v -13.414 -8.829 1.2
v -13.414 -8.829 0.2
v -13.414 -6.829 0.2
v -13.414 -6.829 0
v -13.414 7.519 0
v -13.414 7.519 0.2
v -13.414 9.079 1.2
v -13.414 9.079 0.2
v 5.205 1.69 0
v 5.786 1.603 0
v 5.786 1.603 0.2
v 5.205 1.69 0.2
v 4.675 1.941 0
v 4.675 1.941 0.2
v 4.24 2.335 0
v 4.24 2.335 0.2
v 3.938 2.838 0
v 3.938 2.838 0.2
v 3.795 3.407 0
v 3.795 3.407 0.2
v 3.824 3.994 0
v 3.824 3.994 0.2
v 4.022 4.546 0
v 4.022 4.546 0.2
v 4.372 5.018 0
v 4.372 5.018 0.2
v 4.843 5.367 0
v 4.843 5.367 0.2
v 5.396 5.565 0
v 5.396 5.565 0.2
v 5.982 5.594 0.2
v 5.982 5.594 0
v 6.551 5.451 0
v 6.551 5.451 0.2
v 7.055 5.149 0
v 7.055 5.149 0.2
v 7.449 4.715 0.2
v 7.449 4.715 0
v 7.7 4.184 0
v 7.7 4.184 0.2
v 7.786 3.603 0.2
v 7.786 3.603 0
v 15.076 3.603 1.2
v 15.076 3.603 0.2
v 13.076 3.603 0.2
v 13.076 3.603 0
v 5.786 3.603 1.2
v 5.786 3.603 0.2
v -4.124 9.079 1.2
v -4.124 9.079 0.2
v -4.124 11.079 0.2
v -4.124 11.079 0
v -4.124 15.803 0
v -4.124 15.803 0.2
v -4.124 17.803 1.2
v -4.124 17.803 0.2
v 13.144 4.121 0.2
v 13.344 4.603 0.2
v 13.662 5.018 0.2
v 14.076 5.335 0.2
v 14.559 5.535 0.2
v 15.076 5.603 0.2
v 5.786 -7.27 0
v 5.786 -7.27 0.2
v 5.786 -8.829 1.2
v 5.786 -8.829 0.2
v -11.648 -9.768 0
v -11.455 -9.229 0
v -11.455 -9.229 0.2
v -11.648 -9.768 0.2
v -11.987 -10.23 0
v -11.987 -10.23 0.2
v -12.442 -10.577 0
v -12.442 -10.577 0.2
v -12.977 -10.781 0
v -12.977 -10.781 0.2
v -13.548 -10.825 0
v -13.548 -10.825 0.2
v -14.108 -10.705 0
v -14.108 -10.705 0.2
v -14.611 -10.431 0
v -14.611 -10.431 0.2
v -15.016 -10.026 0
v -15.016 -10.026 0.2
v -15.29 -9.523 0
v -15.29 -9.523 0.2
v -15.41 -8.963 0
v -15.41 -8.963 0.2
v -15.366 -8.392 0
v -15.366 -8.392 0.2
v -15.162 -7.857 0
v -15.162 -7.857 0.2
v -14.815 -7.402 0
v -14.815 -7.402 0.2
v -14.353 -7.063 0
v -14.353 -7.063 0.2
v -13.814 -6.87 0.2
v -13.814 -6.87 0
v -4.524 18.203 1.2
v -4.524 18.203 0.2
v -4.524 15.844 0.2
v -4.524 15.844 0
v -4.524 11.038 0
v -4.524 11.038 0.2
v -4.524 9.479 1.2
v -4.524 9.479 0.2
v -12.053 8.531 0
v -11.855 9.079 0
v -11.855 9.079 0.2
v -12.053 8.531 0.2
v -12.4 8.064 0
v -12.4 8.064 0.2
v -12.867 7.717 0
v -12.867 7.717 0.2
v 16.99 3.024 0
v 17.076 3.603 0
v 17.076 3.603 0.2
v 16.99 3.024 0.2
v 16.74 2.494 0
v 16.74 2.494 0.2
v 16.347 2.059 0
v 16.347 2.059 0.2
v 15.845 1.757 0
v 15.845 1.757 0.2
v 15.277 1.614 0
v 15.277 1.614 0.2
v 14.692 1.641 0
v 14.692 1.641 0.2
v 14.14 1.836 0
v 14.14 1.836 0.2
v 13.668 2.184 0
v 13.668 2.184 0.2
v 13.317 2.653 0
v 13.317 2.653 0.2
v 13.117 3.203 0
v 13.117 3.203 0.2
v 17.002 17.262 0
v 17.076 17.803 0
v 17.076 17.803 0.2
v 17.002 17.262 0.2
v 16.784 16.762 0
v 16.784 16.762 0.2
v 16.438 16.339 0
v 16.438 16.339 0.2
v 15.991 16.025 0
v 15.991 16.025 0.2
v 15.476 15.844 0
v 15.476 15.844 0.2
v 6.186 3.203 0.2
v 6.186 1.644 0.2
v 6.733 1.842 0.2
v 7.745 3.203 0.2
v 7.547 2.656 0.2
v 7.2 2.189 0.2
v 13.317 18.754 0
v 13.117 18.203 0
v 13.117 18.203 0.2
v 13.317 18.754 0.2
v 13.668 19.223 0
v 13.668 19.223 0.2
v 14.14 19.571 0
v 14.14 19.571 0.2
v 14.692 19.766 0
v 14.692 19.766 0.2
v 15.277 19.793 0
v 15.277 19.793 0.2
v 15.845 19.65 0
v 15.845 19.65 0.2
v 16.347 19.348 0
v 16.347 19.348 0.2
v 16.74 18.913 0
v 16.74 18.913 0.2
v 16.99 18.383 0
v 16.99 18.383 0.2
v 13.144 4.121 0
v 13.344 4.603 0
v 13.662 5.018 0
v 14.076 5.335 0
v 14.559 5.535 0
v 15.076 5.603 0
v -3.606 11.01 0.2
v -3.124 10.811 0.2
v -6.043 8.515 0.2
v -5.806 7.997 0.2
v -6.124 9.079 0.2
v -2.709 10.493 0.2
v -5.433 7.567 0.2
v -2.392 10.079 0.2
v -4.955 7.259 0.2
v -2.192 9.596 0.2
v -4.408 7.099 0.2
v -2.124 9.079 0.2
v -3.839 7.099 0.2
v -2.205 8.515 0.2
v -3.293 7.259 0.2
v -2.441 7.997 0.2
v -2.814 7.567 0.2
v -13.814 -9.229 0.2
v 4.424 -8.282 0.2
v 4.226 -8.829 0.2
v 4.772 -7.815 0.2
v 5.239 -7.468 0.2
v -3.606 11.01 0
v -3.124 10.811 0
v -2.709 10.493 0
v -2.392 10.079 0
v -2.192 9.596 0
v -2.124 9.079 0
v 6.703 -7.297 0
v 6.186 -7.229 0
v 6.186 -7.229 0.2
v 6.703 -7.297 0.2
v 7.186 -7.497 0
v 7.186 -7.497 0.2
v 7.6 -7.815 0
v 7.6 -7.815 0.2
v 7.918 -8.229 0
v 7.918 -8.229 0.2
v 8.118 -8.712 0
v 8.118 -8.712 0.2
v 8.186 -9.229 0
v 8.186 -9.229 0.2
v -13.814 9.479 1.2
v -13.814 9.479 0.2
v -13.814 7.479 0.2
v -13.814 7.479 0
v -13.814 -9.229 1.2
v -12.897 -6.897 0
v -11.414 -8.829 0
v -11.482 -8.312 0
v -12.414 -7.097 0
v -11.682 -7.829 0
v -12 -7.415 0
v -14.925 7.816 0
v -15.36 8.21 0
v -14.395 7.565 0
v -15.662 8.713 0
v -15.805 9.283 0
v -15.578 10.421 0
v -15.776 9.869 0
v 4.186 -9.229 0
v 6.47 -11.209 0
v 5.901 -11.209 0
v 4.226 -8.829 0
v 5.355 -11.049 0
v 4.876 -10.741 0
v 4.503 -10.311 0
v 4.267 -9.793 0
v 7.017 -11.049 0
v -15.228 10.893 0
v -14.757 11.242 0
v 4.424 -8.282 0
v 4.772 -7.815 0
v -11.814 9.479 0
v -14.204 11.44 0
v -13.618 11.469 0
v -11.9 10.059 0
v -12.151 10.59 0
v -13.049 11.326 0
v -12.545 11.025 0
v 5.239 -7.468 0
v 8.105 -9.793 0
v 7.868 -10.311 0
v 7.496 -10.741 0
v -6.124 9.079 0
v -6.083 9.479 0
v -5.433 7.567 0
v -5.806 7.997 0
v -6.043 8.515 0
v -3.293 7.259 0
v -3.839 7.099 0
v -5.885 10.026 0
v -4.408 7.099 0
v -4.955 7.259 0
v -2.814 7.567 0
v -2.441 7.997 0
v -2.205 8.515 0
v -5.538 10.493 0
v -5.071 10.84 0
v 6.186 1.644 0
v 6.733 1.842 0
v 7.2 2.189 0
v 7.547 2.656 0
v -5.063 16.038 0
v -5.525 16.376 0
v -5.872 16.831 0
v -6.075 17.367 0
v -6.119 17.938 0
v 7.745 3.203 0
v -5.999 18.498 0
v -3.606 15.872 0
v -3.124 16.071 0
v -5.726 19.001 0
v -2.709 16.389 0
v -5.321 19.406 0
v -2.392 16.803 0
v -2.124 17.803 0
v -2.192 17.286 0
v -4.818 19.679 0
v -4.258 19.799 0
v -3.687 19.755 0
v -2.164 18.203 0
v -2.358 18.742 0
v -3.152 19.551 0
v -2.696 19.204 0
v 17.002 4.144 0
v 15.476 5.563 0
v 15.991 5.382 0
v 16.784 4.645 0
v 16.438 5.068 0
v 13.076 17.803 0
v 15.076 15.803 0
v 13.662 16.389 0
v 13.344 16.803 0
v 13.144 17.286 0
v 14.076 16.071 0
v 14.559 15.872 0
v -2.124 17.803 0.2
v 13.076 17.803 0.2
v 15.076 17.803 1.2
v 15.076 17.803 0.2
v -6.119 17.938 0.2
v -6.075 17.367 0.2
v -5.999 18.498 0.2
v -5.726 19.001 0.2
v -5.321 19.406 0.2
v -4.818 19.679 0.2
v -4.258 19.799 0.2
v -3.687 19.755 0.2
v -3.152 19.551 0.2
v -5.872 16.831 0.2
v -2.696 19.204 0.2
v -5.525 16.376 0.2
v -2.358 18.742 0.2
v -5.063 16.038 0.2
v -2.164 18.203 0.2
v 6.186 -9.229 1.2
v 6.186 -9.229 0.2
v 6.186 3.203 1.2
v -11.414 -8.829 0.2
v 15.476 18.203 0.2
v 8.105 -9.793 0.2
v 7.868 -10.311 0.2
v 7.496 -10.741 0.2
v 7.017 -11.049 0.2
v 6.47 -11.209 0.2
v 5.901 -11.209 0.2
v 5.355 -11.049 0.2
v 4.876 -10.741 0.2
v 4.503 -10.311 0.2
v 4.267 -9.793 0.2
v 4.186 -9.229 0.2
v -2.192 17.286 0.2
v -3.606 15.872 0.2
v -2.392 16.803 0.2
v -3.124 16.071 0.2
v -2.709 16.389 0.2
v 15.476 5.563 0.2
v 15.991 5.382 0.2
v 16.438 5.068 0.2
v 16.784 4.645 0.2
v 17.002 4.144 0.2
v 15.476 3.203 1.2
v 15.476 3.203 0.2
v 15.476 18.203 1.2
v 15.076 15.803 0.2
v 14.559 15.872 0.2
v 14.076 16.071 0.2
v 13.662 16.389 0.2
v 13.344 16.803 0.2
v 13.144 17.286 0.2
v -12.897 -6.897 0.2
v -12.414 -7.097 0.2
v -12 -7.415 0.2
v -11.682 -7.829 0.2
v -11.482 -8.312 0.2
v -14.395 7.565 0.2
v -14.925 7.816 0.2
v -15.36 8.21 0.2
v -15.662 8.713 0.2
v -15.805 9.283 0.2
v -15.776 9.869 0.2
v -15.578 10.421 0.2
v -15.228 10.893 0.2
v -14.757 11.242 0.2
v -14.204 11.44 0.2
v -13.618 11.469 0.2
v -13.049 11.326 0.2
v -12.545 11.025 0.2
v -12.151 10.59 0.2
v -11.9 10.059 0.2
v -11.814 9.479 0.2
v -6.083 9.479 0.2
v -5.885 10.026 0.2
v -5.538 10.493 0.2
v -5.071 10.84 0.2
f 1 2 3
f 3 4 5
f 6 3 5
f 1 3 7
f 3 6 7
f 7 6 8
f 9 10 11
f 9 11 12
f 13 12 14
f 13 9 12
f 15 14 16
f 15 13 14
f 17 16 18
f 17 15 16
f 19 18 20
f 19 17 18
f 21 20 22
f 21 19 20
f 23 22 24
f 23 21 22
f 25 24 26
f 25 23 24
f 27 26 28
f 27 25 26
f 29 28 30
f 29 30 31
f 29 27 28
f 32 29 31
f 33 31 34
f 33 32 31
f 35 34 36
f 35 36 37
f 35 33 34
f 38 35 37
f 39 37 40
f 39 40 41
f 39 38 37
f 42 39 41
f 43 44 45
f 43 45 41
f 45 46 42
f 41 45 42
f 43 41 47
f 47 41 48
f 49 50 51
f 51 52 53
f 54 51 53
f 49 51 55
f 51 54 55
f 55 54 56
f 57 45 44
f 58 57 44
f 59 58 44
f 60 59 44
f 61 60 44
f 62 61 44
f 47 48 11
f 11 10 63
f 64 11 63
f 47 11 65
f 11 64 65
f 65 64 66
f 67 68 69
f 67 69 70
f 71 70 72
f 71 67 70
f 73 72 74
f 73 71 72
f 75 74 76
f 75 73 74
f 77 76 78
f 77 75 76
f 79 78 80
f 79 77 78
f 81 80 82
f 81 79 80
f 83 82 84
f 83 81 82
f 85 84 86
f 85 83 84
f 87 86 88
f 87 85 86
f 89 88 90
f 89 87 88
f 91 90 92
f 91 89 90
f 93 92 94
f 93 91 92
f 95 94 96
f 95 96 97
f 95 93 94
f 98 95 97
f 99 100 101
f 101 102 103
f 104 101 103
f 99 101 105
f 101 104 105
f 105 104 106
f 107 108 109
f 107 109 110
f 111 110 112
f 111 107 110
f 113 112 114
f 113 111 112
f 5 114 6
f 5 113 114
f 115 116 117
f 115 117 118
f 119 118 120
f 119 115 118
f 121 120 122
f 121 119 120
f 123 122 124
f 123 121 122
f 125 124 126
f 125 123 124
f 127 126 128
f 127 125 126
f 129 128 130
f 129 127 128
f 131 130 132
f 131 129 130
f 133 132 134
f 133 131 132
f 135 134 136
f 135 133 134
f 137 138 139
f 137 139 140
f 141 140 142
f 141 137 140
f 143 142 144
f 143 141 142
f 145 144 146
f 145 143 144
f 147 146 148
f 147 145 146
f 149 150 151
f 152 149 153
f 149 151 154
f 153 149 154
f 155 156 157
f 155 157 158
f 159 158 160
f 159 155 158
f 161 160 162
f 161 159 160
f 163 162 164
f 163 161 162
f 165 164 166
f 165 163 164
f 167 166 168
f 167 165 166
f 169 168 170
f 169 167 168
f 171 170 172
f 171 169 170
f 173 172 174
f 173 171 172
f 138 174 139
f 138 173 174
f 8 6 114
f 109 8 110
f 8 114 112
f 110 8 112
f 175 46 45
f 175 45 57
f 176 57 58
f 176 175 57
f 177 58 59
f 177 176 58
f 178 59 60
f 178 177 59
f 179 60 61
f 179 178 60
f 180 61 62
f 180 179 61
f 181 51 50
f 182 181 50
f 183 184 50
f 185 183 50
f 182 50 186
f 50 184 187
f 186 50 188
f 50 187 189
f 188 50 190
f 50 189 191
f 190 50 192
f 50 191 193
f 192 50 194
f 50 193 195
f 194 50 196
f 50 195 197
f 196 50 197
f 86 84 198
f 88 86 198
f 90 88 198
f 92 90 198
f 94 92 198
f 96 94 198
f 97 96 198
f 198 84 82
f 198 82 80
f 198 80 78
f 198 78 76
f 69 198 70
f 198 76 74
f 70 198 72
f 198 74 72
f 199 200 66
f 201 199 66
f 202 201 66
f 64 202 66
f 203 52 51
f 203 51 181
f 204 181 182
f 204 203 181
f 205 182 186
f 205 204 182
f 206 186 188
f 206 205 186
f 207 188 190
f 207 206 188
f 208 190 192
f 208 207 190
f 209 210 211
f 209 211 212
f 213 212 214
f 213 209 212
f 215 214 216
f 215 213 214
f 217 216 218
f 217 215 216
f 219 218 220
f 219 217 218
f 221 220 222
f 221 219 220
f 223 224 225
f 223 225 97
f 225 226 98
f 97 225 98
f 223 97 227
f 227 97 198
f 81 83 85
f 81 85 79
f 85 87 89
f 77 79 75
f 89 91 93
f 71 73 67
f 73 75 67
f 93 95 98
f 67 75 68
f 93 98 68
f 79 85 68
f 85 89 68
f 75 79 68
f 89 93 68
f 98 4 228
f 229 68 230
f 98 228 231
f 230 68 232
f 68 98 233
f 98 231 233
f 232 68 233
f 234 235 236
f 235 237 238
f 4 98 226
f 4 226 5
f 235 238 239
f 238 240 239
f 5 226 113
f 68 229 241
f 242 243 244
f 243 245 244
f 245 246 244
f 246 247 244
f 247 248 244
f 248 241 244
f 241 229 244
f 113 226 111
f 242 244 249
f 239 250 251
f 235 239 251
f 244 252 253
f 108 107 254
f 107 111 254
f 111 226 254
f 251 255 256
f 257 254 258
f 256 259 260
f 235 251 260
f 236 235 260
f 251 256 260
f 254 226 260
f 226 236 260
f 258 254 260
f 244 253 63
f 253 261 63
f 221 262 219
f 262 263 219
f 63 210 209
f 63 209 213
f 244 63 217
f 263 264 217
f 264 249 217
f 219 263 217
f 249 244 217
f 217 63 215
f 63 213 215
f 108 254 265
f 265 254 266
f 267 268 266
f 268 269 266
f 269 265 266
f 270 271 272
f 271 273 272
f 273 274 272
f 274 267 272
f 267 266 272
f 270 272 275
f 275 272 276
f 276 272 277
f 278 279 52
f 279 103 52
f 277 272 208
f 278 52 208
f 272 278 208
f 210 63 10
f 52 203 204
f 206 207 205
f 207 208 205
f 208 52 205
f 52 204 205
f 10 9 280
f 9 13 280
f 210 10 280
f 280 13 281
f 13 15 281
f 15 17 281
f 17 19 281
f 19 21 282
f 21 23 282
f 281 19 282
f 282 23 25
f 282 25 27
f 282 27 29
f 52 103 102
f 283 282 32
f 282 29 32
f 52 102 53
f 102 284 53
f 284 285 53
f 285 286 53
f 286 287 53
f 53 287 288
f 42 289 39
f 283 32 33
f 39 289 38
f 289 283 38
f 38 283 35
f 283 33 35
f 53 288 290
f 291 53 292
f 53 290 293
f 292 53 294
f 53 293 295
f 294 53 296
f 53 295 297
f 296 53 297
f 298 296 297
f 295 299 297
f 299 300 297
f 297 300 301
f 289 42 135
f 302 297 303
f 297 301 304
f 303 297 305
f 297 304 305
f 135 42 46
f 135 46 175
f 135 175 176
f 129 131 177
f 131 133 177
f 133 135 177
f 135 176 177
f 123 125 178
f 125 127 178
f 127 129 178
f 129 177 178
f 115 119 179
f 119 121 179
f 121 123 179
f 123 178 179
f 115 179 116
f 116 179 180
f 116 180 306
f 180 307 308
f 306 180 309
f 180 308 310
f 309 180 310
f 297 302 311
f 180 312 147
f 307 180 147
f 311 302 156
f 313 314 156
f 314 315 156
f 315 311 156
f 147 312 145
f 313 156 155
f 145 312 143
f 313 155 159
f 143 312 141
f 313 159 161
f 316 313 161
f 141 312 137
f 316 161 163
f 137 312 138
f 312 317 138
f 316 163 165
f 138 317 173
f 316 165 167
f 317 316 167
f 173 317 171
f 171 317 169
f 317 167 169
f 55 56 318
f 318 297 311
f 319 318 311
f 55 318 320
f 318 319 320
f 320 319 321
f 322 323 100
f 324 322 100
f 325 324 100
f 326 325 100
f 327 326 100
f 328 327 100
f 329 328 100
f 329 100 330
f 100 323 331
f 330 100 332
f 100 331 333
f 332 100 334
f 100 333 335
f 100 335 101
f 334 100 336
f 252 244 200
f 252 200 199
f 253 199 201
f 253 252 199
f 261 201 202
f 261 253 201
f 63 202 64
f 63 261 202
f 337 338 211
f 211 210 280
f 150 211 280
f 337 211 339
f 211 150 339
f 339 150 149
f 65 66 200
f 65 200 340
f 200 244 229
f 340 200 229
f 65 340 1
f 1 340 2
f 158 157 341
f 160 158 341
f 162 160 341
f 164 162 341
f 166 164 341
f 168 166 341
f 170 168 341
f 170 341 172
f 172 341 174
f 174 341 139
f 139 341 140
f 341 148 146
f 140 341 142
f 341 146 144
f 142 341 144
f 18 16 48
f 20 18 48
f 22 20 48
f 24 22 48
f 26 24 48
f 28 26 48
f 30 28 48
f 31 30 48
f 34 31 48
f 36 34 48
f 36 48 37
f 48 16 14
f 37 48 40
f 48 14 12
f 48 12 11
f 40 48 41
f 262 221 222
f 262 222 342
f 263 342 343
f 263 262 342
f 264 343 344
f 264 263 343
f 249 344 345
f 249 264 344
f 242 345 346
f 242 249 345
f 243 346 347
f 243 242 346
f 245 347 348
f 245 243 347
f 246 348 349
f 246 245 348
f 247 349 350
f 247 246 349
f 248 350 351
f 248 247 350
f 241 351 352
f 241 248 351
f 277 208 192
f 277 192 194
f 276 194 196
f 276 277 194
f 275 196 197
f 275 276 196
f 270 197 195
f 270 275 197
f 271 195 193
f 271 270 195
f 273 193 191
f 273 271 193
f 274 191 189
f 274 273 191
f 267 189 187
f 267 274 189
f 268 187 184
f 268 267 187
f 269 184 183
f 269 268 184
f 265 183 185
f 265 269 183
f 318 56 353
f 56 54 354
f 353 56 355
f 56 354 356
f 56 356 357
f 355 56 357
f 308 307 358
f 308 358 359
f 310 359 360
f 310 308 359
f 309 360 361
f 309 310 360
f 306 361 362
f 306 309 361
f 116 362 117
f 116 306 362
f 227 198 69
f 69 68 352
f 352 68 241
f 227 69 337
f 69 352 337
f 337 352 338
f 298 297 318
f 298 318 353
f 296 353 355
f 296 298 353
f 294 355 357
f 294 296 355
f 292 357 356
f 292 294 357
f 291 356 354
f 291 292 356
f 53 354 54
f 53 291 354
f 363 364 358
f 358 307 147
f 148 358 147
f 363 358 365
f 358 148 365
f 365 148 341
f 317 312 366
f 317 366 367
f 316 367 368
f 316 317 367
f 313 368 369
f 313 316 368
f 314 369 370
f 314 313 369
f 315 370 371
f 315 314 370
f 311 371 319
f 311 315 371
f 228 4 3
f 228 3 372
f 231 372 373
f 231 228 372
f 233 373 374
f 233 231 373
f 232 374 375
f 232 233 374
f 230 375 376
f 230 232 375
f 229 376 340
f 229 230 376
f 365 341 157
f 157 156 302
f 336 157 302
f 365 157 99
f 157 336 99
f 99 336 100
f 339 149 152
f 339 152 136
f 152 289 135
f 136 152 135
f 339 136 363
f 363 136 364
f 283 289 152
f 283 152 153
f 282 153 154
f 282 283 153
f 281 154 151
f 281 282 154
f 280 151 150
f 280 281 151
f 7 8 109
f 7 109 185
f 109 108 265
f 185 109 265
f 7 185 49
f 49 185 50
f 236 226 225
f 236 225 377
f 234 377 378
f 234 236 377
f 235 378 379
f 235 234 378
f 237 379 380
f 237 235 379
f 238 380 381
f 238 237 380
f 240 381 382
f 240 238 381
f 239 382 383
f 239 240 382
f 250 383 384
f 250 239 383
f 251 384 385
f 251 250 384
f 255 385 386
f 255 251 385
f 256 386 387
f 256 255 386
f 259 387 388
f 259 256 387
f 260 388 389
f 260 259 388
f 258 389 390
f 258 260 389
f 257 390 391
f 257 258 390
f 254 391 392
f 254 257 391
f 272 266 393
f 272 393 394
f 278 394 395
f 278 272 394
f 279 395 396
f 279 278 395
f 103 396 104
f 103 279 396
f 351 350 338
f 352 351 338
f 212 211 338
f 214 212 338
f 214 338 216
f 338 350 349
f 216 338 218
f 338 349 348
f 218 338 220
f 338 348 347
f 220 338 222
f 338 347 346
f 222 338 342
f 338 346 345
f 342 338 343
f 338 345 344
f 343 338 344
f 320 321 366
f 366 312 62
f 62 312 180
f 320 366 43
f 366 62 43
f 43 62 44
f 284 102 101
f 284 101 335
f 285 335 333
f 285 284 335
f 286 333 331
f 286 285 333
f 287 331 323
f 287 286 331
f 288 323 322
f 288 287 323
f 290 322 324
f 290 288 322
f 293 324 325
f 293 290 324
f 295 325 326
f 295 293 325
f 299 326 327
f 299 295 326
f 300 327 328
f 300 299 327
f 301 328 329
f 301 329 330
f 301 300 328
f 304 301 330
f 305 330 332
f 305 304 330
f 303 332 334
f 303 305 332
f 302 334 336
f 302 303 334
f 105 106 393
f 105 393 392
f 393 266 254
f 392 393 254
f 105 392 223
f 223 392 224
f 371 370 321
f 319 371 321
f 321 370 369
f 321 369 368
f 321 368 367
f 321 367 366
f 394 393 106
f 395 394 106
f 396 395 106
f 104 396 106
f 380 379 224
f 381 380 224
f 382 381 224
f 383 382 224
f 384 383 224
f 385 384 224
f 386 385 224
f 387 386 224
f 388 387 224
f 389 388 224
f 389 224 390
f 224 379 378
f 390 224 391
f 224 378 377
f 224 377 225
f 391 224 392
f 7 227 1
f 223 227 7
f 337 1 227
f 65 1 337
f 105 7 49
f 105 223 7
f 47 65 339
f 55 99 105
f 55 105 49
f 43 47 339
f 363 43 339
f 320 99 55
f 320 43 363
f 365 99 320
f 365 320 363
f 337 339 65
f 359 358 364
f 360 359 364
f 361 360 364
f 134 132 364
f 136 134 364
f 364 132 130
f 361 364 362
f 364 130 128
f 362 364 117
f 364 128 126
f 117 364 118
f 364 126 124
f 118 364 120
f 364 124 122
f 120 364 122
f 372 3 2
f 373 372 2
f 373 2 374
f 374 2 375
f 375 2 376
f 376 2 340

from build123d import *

# Parameters (mm, degrees)
F1_DEPTH = 1.2
F3_DEPTH = 0.2


with BuildPart() as f1:
    # F0 (on Top) → F1 (new body)
    with BuildSketch(Plane.XY):
        Polygon((-4.5237019658, 9.4786183909), (-13.8142090873, 9.4786183909), (-13.8142090873, -9.2292996123), (6.1857909127, -9.2292996123), (6.1857909127, 3.2034474425), (15.4762980342, 3.2034474425), (15.4762980342, 18.2034474425), (-4.5237019658, 18.2034474425), align=None)
        Polygon((-4.1237018444, 9.0786182694), (-4.1237018444, 17.8034473211), (15.0762979127, 17.8034473211), (15.0762979127, 3.6034475639), (5.7857907913, 3.6034475639), (5.7857907913, -8.8292994909), (-13.4142089658, -8.8292994909), (-13.4142089658, 9.0786182694), align=None, mode=Mode.SUBTRACT)
    extrude(amount=F1_DEPTH)

    # F2 (on face) → F3 (join)
    with BuildSketch(Plane(origin=(0, 0, 0), x_dir=(1, 0, 0), z_dir=(0, 0, -1))):
        with BuildLine():
            Line((-13.4142089658, 8.8292994909), (-11.4142089658, 8.8292994909))
            ThreePointArc((-11.4142089658, 8.8292994909), (-11.4243366661, 9.0303174766), (-11.4546171964, 9.2292996123))
            Line((-11.4546171964, 9.2292996123), (-13.8142090873, 9.2292996123))
            Line((-13.8142090873, 9.2292996123), (-13.8142090873, 6.8697077215))
            ThreePointArc((-13.8142090873, 6.8697077215), (-13.6152269515, 6.8394271911), (-13.4142089658, 6.8292994909))
            Line((-13.4142089658, 6.8292994909), (-13.4142089658, 8.8292994909))
        make_face()
        with BuildLine():
            ThreePointArc((-13.4142089658, 6.8292994909), (-11.9999954035, 7.4150859285), (-11.4142089658, 8.8292994909))
            Line((-11.4142089658, 8.8292994909), (-13.4142089658, 8.8292994909))
            Line((-13.4142089658, 8.8292994909), (-13.4142089658, 6.8292994909))
        make_face()
        with BuildLine():
            Line((-13.8142090873, 9.2292996123), (-11.4546171964, 9.2292996123))
            ThreePointArc((-11.4546171964, 9.2292996123), (-14.8284225282, 10.2435130533), (-13.8142090873, 6.8697077215))
            Line((-13.8142090873, 6.8697077215), (-13.8142090873, 9.2292996123))
        make_face()
        with BuildLine():
            Line((5.7857907913, 8.8292994909), (4.2261991433, 8.8292994909))
            ThreePointArc((4.2261991433, 8.8292994909), (4.7715773503, 7.81508605), (5.7857907913, 7.2697078429))
            Line((5.7857907913, 7.2697078429), (5.7857907913, 8.8292994909))
        make_face()
        with BuildLine():
            ThreePointArc((4.1857909127, 9.2292996123), (4.1959186129, 9.0282816267), (4.2261991433, 8.8292994909))
            Line((4.2261991433, 8.8292994909), (5.7857907913, 8.8292994909))
            Line((5.7857907913, 8.8292994909), (5.7857907913, 7.2697078429))
            ThreePointArc((5.7857907913, 7.2697078429), (5.984772927, 7.2394273126), (6.1857909127, 7.2292996123))
            Line((6.1857909127, 7.2292996123), (6.1857909127, 9.2292996123))
            Line((6.1857909127, 9.2292996123), (4.1857909127, 9.2292996123))
        make_face()
        with BuildLine():
            ThreePointArc((8.1857909127, 9.2292996123), (6.1857909127, 11.2292996123), (4.1857909127, 9.2292996123))
            Line((4.1857909127, 9.2292996123), (6.1857909127, 9.2292996123))
            Line((6.1857909127, 9.2292996123), (6.1857909127, 7.2292996123))
            ThreePointArc((6.1857909127, 7.2292996123), (7.6000044751, 7.81508605), (8.1857909127, 9.2292996123))
        make_face()
        with BuildLine():
            Line((-13.8142090873, -9.4786183909), (-13.8142090873, -7.4786183909))
            ThreePointArc((-13.8142090873, -7.4786183909), (-15.2284226497, -10.8928319532), (-11.8142090873, -9.4786183909))
            Line((-11.8142090873, -9.4786183909), (-13.8142090873, -9.4786183909))
        make_face()
        with BuildLine():
            Line((-13.4142089658, -9.0786182694), (-13.4142089658, -7.5190266214))
            ThreePointArc((-13.4142089658, -7.5190266214), (-13.6131911016, -7.4887460911), (-13.8142090873, -7.4786183909))
            Line((-13.8142090873, -7.4786183909), (-13.8142090873, -9.4786183909))
            Line((-13.8142090873, -9.4786183909), (-11.8142090873, -9.4786183909))
            ThreePointArc((-11.8142090873, -9.4786183909), (-11.8243367875, -9.2776004052), (-11.8546173178, -9.0786182694))
            Line((-11.8546173178, -9.0786182694), (-13.4142089658, -9.0786182694))
        make_face()
        with BuildLine():
            ThreePointArc((-11.8546173178, -9.0786182694), (-12.3999955249, -8.0644048285), (-13.4142089658, -7.5190266214))
            Line((-13.4142089658, -7.5190266214), (-13.4142089658, -9.0786182694))
            Line((-13.4142089658, -9.0786182694), (-11.8546173178, -9.0786182694))
        make_face()
        with BuildLine():
            ThreePointArc((-2.1237018444, -9.0786182694), (-4.1237018444, -7.0786182694), (-6.1237018444, -9.0786182694))
            Line((-6.1237018444, -9.0786182694), (-4.1237018444, -9.0786182694))
            Line((-4.1237018444, -9.0786182694), (-4.1237018444, -11.0786182694))
            ThreePointArc((-4.1237018444, -11.0786182694), (-2.709488282, -10.4928318318), (-2.1237018444, -9.0786182694))
        make_face()
        with BuildLine():
            Line((-4.1237018444, -9.0786182694), (-6.1237018444, -9.0786182694))
            ThreePointArc((-6.1237018444, -9.0786182694), (-6.1135741441, -9.2796362551), (-6.0832936138, -9.4786183909))
            Line((-6.0832936138, -9.4786183909), (-4.5237019658, -9.4786183909))
            Line((-4.5237019658, -9.4786183909), (-4.5237019658, -11.0382100389))
            ThreePointArc((-4.5237019658, -11.0382100389), (-4.32471983, -11.0684905692), (-4.1237018444, -11.0786182694))
            Line((-4.1237018444, -11.0786182694), (-4.1237018444, -9.0786182694))
        make_face()
        with BuildLine():
            Line((-4.5237019658, -9.4786183909), (-6.0832936138, -9.4786183909))
            ThreePointArc((-6.0832936138, -9.4786183909), (-5.5379154067, -10.4928318318), (-4.5237019658, -11.0382100389))
            Line((-4.5237019658, -11.0382100389), (-4.5237019658, -9.4786183909))
        make_face()
        with BuildLine():
            ThreePointArc((-2.1237018444, -17.8034473211), (-2.709488282, -16.3892337587), (-4.1237018444, -15.8034473211))
            Line((-4.1237018444, -15.8034473211), (-4.1237018444, -17.8034473211))
            Line((-4.1237018444, -17.8034473211), (-2.1237018444, -17.8034473211))
        make_face()
        with BuildLine():
            ThreePointArc((-4.1237018444, -15.8034473211), (-4.32471983, -15.8135750213), (-4.5237019658, -15.8438555516))
            Line((-4.5237019658, -15.8438555516), (-4.5237019658, -18.2034474425))
            Line((-4.5237019658, -18.2034474425), (-2.1641100749, -18.2034474425))
            ThreePointArc((-2.1641100749, -18.2034474425), (-2.1338295446, -18.0044653067), (-2.1237018444, -17.8034473211))
            Line((-2.1237018444, -17.8034473211), (-4.1237018444, -17.8034473211))
            Line((-4.1237018444, -17.8034473211), (-4.1237018444, -15.8034473211))
        make_face()
        with BuildLine():
            Line((-4.5237019658, -18.2034474425), (-4.5237019658, -15.8438555516))
            ThreePointArc((-4.5237019658, -15.8438555516), (-5.5379154067, -19.2176608834), (-2.1641100749, -18.2034474425))
            Line((-2.1641100749, -18.2034474425), (-4.5237019658, -18.2034474425))
        make_face()
        with BuildLine():
            Line((15.0762979127, -17.8034473211), (15.0762979127, -15.8034473211))
            ThreePointArc((15.0762979127, -15.8034473211), (13.6620843504, -16.3892337587), (13.0762979127, -17.8034473211))
            Line((13.0762979127, -17.8034473211), (15.0762979127, -17.8034473211))
        make_face()
        with BuildLine():
            ThreePointArc((15.4762980342, -15.8438555516), (15.2773158984, -15.8135750213), (15.0762979127, -15.8034473211))
            Line((15.0762979127, -15.8034473211), (15.0762979127, -17.8034473211))
            Line((15.0762979127, -17.8034473211), (13.0762979127, -17.8034473211))
            ThreePointArc((13.0762979127, -17.8034473211), (13.086425613, -18.0044653067), (13.1167061433, -18.2034474425))
            Line((13.1167061433, -18.2034474425), (15.4762980342, -18.2034474425))
            Line((15.4762980342, -18.2034474425), (15.4762980342, -15.8438555516))
        make_face()
        with BuildLine():
            ThreePointArc((17.0762979127, -17.8034473211), (16.6254912904, -16.538536305), (15.4762980342, -15.8438555516))
            Line((15.4762980342, -15.8438555516), (15.4762980342, -18.2034474425))
            Line((15.4762980342, -18.2034474425), (13.1167061433, -18.2034474425))
            ThreePointArc((13.1167061433, -18.2034474425), (15.2773158984, -19.7933196208), (17.0762979127, -17.8034473211))
        make_face()
        with BuildLine():
            ThreePointArc((17.0762979127, -3.6034475639), (15.2773158984, -1.6135752642), (13.1167061433, -3.2034474425))
            Line((13.1167061433, -3.2034474425), (15.4762980342, -3.2034474425))
            Line((15.4762980342, -3.2034474425), (15.4762980342, -5.5630393334))
            ThreePointArc((15.4762980342, -5.5630393334), (16.6254912904, -4.86835858), (17.0762979127, -3.6034475639))
        make_face()
        with BuildLine():
            ThreePointArc((13.1167061433, -3.2034474425), (13.086425613, -3.4024295783), (13.0762979127, -3.6034475639))
            Line((13.0762979127, -3.6034475639), (15.0762979127, -3.6034475639))
            Line((15.0762979127, -3.6034475639), (15.0762979127, -5.6034475639))
            ThreePointArc((15.0762979127, -5.6034475639), (15.2773158984, -5.5933198637), (15.4762980342, -5.5630393334))
            Line((15.4762980342, -5.5630393334), (15.4762980342, -3.2034474425))
            Line((15.4762980342, -3.2034474425), (13.1167061433, -3.2034474425))
        make_face()
        with BuildLine():
            Line((15.0762979127, -3.6034475639), (13.0762979127, -3.6034475639))
            ThreePointArc((13.0762979127, -3.6034475639), (13.6620843504, -5.0176611263), (15.0762979127, -5.6034475639))
            Line((15.0762979127, -5.6034475639), (15.0762979127, -3.6034475639))
        make_face()
        with BuildLine():
            Line((5.7857907913, -3.6034475639), (5.7857907913, -1.6034475639))
            ThreePointArc((5.7857907913, -1.6034475639), (4.3715772289, -5.0176611263), (7.7857907913, -3.6034475639))
            Line((7.7857907913, -3.6034475639), (5.7857907913, -3.6034475639))
        make_face()
        with BuildLine():
            ThreePointArc((6.1857909127, -1.6438557945), (5.9868087769, -1.6135752642), (5.7857907913, -1.6034475639))
            Line((5.7857907913, -1.6034475639), (5.7857907913, -3.6034475639))
            Line((5.7857907913, -3.6034475639), (7.7857907913, -3.6034475639))
            ThreePointArc((7.7857907913, -3.6034475639), (7.7756630911, -3.4024295783), (7.7453825607, -3.2034474425))
            Line((7.7453825607, -3.2034474425), (6.1857909127, -3.2034474425))
            Line((6.1857909127, -3.2034474425), (6.1857909127, -1.6438557945))
        make_face()
        with BuildLine():
            ThreePointArc((7.7453825607, -3.2034474425), (7.2000043536, -2.1892340016), (6.1857909127, -1.6438557945))
            Line((6.1857909127, -1.6438557945), (6.1857909127, -3.2034474425))
            Line((6.1857909127, -3.2034474425), (7.7453825607, -3.2034474425))
        make_face()
    extrude(amount=-F3_DEPTH)


solid = f1.part
